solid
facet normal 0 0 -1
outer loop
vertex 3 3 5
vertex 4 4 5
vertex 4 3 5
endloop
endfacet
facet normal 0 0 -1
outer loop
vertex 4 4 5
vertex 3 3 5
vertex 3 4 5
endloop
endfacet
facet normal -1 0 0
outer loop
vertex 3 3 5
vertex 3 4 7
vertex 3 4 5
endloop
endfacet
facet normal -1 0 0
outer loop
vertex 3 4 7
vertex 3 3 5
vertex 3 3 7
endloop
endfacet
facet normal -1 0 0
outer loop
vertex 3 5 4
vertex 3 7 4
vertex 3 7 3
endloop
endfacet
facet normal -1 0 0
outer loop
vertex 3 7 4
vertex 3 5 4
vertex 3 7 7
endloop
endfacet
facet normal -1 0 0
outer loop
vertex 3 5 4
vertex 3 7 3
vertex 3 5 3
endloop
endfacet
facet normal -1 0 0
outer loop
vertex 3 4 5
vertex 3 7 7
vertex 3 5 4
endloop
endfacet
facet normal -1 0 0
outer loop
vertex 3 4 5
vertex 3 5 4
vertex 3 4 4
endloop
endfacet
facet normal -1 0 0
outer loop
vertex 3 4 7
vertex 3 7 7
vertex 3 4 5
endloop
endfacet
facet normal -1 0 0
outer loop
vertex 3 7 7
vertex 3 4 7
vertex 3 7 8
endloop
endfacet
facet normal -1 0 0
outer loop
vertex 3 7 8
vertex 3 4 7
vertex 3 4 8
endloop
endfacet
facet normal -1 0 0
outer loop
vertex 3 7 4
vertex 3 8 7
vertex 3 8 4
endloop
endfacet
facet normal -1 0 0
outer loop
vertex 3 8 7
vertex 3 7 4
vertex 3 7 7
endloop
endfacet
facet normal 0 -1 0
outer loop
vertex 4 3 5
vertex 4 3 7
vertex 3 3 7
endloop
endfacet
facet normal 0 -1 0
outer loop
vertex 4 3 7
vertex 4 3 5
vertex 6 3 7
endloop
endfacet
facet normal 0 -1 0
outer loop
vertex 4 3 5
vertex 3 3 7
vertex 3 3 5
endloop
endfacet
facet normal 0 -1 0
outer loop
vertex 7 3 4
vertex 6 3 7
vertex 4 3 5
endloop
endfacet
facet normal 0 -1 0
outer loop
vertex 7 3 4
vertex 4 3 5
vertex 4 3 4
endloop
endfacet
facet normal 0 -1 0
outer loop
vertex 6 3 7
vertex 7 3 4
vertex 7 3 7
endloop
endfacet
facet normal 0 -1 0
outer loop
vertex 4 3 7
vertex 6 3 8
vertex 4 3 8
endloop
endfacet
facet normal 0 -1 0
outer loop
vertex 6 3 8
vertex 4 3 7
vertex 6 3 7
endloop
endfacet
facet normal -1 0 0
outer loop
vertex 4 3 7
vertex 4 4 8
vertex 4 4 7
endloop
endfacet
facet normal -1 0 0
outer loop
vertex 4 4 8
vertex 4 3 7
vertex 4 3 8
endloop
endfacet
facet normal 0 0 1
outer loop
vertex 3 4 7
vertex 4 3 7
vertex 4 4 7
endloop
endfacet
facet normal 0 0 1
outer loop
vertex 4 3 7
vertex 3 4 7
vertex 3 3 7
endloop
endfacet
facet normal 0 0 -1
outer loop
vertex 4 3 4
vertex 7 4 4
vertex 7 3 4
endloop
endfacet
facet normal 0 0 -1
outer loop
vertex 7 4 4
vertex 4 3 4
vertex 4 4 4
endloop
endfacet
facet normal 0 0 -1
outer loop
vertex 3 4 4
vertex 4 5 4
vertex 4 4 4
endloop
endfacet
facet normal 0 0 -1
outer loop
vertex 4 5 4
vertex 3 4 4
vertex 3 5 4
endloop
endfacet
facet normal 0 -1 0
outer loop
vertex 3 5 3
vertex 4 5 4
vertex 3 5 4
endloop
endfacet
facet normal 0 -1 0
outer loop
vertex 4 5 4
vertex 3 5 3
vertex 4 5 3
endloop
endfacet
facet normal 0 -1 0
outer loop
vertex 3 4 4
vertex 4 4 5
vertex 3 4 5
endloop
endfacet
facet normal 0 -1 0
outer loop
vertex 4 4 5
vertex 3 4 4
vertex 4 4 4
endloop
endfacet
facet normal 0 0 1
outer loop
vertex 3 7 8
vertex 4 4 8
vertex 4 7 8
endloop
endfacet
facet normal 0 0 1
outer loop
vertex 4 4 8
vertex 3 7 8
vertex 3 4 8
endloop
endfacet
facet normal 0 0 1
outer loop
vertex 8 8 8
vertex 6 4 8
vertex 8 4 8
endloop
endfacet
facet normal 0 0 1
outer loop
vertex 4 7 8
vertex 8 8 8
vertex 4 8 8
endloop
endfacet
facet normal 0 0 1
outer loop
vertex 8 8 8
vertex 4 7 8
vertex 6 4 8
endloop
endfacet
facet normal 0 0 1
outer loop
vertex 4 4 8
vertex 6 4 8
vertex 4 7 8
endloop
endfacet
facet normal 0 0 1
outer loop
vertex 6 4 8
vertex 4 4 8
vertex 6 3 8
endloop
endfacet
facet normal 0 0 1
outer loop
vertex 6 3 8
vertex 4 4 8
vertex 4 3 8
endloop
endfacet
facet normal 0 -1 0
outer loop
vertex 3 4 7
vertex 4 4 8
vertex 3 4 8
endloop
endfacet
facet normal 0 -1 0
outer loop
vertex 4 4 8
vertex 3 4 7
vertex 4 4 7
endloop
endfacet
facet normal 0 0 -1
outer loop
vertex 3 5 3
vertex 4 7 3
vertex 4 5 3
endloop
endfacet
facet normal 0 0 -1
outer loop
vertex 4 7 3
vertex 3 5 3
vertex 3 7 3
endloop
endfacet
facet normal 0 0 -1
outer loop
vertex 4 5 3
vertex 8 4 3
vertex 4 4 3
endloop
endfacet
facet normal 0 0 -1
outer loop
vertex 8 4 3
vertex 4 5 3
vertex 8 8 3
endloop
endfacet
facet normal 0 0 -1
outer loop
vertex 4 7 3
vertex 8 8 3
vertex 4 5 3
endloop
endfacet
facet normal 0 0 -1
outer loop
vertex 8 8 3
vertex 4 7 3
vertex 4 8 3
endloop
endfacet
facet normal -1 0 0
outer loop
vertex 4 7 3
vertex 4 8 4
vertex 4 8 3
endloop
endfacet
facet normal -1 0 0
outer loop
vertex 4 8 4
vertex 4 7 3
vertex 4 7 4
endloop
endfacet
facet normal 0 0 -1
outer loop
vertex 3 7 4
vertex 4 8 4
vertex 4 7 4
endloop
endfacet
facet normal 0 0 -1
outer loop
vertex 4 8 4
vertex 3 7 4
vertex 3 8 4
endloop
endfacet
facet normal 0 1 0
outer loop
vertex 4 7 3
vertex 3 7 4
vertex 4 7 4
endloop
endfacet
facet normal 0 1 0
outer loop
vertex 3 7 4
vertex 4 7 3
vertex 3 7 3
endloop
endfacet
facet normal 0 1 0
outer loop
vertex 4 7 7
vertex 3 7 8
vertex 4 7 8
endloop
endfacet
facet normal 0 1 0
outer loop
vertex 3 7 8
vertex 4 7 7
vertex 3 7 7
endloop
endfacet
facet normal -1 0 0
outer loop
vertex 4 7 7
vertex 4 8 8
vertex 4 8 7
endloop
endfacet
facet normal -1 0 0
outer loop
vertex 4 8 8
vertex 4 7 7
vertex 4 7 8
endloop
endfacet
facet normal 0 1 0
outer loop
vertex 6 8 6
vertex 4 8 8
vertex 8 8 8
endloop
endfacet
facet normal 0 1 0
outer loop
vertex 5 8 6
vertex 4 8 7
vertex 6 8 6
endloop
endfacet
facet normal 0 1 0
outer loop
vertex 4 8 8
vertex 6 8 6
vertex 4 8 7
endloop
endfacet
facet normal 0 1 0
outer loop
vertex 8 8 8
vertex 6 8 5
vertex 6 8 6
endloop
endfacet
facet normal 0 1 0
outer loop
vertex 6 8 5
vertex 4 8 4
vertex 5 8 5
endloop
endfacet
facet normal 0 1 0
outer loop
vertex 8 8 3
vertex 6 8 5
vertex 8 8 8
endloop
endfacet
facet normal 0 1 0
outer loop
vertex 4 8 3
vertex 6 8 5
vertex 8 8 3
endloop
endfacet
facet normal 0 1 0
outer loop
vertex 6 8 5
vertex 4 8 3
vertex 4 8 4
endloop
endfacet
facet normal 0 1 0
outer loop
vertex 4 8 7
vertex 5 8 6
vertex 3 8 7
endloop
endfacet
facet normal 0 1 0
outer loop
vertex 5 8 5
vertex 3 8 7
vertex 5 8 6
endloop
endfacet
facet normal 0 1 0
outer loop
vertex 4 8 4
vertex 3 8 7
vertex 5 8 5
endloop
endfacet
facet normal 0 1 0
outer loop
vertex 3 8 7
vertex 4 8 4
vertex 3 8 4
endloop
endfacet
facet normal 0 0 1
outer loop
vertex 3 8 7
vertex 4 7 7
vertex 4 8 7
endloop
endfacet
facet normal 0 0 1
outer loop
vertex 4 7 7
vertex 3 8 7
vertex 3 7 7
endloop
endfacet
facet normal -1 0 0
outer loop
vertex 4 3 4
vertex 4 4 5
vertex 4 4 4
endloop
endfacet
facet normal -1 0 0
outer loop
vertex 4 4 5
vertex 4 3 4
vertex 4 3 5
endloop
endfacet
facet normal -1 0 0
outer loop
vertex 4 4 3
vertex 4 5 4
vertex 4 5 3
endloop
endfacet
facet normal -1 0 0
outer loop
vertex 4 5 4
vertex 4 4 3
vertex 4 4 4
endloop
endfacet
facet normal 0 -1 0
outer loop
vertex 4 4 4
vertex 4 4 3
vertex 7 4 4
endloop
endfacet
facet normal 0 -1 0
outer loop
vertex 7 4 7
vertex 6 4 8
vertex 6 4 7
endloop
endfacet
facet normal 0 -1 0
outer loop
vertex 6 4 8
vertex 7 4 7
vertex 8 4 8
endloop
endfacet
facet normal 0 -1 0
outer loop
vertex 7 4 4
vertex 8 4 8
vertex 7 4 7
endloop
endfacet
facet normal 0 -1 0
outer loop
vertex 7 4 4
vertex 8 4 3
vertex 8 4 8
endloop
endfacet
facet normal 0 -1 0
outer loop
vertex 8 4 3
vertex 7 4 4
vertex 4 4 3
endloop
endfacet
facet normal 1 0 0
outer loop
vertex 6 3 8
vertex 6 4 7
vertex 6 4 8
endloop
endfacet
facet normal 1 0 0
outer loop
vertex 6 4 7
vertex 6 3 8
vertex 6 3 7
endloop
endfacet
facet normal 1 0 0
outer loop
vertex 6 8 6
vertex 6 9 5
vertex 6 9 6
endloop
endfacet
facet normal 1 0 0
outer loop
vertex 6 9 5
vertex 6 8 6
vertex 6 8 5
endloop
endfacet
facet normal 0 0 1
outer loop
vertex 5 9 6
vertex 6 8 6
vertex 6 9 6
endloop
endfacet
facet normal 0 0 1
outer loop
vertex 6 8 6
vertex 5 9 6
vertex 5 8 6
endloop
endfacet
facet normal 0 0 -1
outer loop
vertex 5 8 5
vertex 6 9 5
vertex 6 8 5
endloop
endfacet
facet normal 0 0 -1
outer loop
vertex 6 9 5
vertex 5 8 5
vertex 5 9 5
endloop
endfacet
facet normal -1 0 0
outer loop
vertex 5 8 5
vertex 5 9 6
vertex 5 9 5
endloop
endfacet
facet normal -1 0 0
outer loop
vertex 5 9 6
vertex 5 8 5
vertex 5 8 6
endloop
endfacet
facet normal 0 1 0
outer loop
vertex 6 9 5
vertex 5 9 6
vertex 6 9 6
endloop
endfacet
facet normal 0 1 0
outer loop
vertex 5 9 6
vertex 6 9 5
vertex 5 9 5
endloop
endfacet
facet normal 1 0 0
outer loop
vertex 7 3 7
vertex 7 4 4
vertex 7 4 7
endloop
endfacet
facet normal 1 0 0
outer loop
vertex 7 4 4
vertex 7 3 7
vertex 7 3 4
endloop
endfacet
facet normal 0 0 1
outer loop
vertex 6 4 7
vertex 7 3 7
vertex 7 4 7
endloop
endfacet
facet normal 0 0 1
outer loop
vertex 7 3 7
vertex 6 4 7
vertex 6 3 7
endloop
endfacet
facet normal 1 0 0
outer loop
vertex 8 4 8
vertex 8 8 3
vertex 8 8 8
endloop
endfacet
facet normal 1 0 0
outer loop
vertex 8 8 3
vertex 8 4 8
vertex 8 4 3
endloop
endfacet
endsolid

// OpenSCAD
// Create matrix
mr = 	[
[3,3,5],
[3,3,6],
[3,4,4],
[3,4,5],
[3,4,6],
[3,4,7],
[3,5,3],
[3,5,4],
[3,5,5],
[3,5,6],
[3,5,7],
[3,6,3],
[3,6,4],
[3,6,5],
[3,6,6],
[3,6,7],
[3,7,4],
[3,7,5],
[3,7,6],
[4,3,4],
[4,3,5],
[4,3,6],
[4,3,7],
[4,4,3],
[4,4,4],
[4,4,5],
[4,4,6],
[4,4,7],
[4,5,3],
[4,5,4],
[4,5,5],
[4,5,6],
[4,5,7],
[4,6,3],
[4,6,4],
[4,6,5],
[4,6,6],
[4,6,7],
[4,7,3],
[4,7,4],
[4,7,5],
[4,7,6],
[4,7,7],
[5,3,4],
[5,3,5],
[5,3,6],
[5,3,7],
[5,4,3],
[5,4,4],
[5,4,5],
[5,4,6],
[5,4,7],
[5,5,3],
[5,5,4],
[5,5,5],
[5,5,6],
[5,5,7],
[5,6,3],
[5,6,4],
[5,6,5],
[5,6,6],
[5,6,7],
[5,7,3],
[5,7,4],
[5,7,5],
[5,7,6],
[5,7,7],
[5,8,5],
[6,3,4],
[6,3,5],
[6,3,6],
[6,4,3],
[6,4,4],
[6,4,5],
[6,4,6],
[6,4,7],
[6,5,3],
[6,5,4],
[6,5,5],
[6,5,6],
[6,5,7],
[6,6,3],
[6,6,4],
[6,6,5],
[6,6,6],
[6,6,7],
[6,7,3],
[6,7,4],
[6,7,5],
[6,7,6],
[6,7,7],
[7,4,3],
[7,4,4],
[7,4,5],
[7,4,6],
[7,4,7],
[7,5,3],
[7,5,4],
[7,5,5],
[7,5,6],
[7,5,7],
[7,6,3],
[7,6,4],
[7,6,5],
[7,6,6],
[7,6,7],
[7,7,3],
[7,7,4],
[7,7,5],
[7,7,6],
[7,7,7],
		];
// Draw cubes
// Z-axis
for (a =[0:len(mr)-1]){
	color([1,0,0]) translate([mr[a][0], mr[a][1], mr[a][2]])cube([1,1,1]);
			
}
